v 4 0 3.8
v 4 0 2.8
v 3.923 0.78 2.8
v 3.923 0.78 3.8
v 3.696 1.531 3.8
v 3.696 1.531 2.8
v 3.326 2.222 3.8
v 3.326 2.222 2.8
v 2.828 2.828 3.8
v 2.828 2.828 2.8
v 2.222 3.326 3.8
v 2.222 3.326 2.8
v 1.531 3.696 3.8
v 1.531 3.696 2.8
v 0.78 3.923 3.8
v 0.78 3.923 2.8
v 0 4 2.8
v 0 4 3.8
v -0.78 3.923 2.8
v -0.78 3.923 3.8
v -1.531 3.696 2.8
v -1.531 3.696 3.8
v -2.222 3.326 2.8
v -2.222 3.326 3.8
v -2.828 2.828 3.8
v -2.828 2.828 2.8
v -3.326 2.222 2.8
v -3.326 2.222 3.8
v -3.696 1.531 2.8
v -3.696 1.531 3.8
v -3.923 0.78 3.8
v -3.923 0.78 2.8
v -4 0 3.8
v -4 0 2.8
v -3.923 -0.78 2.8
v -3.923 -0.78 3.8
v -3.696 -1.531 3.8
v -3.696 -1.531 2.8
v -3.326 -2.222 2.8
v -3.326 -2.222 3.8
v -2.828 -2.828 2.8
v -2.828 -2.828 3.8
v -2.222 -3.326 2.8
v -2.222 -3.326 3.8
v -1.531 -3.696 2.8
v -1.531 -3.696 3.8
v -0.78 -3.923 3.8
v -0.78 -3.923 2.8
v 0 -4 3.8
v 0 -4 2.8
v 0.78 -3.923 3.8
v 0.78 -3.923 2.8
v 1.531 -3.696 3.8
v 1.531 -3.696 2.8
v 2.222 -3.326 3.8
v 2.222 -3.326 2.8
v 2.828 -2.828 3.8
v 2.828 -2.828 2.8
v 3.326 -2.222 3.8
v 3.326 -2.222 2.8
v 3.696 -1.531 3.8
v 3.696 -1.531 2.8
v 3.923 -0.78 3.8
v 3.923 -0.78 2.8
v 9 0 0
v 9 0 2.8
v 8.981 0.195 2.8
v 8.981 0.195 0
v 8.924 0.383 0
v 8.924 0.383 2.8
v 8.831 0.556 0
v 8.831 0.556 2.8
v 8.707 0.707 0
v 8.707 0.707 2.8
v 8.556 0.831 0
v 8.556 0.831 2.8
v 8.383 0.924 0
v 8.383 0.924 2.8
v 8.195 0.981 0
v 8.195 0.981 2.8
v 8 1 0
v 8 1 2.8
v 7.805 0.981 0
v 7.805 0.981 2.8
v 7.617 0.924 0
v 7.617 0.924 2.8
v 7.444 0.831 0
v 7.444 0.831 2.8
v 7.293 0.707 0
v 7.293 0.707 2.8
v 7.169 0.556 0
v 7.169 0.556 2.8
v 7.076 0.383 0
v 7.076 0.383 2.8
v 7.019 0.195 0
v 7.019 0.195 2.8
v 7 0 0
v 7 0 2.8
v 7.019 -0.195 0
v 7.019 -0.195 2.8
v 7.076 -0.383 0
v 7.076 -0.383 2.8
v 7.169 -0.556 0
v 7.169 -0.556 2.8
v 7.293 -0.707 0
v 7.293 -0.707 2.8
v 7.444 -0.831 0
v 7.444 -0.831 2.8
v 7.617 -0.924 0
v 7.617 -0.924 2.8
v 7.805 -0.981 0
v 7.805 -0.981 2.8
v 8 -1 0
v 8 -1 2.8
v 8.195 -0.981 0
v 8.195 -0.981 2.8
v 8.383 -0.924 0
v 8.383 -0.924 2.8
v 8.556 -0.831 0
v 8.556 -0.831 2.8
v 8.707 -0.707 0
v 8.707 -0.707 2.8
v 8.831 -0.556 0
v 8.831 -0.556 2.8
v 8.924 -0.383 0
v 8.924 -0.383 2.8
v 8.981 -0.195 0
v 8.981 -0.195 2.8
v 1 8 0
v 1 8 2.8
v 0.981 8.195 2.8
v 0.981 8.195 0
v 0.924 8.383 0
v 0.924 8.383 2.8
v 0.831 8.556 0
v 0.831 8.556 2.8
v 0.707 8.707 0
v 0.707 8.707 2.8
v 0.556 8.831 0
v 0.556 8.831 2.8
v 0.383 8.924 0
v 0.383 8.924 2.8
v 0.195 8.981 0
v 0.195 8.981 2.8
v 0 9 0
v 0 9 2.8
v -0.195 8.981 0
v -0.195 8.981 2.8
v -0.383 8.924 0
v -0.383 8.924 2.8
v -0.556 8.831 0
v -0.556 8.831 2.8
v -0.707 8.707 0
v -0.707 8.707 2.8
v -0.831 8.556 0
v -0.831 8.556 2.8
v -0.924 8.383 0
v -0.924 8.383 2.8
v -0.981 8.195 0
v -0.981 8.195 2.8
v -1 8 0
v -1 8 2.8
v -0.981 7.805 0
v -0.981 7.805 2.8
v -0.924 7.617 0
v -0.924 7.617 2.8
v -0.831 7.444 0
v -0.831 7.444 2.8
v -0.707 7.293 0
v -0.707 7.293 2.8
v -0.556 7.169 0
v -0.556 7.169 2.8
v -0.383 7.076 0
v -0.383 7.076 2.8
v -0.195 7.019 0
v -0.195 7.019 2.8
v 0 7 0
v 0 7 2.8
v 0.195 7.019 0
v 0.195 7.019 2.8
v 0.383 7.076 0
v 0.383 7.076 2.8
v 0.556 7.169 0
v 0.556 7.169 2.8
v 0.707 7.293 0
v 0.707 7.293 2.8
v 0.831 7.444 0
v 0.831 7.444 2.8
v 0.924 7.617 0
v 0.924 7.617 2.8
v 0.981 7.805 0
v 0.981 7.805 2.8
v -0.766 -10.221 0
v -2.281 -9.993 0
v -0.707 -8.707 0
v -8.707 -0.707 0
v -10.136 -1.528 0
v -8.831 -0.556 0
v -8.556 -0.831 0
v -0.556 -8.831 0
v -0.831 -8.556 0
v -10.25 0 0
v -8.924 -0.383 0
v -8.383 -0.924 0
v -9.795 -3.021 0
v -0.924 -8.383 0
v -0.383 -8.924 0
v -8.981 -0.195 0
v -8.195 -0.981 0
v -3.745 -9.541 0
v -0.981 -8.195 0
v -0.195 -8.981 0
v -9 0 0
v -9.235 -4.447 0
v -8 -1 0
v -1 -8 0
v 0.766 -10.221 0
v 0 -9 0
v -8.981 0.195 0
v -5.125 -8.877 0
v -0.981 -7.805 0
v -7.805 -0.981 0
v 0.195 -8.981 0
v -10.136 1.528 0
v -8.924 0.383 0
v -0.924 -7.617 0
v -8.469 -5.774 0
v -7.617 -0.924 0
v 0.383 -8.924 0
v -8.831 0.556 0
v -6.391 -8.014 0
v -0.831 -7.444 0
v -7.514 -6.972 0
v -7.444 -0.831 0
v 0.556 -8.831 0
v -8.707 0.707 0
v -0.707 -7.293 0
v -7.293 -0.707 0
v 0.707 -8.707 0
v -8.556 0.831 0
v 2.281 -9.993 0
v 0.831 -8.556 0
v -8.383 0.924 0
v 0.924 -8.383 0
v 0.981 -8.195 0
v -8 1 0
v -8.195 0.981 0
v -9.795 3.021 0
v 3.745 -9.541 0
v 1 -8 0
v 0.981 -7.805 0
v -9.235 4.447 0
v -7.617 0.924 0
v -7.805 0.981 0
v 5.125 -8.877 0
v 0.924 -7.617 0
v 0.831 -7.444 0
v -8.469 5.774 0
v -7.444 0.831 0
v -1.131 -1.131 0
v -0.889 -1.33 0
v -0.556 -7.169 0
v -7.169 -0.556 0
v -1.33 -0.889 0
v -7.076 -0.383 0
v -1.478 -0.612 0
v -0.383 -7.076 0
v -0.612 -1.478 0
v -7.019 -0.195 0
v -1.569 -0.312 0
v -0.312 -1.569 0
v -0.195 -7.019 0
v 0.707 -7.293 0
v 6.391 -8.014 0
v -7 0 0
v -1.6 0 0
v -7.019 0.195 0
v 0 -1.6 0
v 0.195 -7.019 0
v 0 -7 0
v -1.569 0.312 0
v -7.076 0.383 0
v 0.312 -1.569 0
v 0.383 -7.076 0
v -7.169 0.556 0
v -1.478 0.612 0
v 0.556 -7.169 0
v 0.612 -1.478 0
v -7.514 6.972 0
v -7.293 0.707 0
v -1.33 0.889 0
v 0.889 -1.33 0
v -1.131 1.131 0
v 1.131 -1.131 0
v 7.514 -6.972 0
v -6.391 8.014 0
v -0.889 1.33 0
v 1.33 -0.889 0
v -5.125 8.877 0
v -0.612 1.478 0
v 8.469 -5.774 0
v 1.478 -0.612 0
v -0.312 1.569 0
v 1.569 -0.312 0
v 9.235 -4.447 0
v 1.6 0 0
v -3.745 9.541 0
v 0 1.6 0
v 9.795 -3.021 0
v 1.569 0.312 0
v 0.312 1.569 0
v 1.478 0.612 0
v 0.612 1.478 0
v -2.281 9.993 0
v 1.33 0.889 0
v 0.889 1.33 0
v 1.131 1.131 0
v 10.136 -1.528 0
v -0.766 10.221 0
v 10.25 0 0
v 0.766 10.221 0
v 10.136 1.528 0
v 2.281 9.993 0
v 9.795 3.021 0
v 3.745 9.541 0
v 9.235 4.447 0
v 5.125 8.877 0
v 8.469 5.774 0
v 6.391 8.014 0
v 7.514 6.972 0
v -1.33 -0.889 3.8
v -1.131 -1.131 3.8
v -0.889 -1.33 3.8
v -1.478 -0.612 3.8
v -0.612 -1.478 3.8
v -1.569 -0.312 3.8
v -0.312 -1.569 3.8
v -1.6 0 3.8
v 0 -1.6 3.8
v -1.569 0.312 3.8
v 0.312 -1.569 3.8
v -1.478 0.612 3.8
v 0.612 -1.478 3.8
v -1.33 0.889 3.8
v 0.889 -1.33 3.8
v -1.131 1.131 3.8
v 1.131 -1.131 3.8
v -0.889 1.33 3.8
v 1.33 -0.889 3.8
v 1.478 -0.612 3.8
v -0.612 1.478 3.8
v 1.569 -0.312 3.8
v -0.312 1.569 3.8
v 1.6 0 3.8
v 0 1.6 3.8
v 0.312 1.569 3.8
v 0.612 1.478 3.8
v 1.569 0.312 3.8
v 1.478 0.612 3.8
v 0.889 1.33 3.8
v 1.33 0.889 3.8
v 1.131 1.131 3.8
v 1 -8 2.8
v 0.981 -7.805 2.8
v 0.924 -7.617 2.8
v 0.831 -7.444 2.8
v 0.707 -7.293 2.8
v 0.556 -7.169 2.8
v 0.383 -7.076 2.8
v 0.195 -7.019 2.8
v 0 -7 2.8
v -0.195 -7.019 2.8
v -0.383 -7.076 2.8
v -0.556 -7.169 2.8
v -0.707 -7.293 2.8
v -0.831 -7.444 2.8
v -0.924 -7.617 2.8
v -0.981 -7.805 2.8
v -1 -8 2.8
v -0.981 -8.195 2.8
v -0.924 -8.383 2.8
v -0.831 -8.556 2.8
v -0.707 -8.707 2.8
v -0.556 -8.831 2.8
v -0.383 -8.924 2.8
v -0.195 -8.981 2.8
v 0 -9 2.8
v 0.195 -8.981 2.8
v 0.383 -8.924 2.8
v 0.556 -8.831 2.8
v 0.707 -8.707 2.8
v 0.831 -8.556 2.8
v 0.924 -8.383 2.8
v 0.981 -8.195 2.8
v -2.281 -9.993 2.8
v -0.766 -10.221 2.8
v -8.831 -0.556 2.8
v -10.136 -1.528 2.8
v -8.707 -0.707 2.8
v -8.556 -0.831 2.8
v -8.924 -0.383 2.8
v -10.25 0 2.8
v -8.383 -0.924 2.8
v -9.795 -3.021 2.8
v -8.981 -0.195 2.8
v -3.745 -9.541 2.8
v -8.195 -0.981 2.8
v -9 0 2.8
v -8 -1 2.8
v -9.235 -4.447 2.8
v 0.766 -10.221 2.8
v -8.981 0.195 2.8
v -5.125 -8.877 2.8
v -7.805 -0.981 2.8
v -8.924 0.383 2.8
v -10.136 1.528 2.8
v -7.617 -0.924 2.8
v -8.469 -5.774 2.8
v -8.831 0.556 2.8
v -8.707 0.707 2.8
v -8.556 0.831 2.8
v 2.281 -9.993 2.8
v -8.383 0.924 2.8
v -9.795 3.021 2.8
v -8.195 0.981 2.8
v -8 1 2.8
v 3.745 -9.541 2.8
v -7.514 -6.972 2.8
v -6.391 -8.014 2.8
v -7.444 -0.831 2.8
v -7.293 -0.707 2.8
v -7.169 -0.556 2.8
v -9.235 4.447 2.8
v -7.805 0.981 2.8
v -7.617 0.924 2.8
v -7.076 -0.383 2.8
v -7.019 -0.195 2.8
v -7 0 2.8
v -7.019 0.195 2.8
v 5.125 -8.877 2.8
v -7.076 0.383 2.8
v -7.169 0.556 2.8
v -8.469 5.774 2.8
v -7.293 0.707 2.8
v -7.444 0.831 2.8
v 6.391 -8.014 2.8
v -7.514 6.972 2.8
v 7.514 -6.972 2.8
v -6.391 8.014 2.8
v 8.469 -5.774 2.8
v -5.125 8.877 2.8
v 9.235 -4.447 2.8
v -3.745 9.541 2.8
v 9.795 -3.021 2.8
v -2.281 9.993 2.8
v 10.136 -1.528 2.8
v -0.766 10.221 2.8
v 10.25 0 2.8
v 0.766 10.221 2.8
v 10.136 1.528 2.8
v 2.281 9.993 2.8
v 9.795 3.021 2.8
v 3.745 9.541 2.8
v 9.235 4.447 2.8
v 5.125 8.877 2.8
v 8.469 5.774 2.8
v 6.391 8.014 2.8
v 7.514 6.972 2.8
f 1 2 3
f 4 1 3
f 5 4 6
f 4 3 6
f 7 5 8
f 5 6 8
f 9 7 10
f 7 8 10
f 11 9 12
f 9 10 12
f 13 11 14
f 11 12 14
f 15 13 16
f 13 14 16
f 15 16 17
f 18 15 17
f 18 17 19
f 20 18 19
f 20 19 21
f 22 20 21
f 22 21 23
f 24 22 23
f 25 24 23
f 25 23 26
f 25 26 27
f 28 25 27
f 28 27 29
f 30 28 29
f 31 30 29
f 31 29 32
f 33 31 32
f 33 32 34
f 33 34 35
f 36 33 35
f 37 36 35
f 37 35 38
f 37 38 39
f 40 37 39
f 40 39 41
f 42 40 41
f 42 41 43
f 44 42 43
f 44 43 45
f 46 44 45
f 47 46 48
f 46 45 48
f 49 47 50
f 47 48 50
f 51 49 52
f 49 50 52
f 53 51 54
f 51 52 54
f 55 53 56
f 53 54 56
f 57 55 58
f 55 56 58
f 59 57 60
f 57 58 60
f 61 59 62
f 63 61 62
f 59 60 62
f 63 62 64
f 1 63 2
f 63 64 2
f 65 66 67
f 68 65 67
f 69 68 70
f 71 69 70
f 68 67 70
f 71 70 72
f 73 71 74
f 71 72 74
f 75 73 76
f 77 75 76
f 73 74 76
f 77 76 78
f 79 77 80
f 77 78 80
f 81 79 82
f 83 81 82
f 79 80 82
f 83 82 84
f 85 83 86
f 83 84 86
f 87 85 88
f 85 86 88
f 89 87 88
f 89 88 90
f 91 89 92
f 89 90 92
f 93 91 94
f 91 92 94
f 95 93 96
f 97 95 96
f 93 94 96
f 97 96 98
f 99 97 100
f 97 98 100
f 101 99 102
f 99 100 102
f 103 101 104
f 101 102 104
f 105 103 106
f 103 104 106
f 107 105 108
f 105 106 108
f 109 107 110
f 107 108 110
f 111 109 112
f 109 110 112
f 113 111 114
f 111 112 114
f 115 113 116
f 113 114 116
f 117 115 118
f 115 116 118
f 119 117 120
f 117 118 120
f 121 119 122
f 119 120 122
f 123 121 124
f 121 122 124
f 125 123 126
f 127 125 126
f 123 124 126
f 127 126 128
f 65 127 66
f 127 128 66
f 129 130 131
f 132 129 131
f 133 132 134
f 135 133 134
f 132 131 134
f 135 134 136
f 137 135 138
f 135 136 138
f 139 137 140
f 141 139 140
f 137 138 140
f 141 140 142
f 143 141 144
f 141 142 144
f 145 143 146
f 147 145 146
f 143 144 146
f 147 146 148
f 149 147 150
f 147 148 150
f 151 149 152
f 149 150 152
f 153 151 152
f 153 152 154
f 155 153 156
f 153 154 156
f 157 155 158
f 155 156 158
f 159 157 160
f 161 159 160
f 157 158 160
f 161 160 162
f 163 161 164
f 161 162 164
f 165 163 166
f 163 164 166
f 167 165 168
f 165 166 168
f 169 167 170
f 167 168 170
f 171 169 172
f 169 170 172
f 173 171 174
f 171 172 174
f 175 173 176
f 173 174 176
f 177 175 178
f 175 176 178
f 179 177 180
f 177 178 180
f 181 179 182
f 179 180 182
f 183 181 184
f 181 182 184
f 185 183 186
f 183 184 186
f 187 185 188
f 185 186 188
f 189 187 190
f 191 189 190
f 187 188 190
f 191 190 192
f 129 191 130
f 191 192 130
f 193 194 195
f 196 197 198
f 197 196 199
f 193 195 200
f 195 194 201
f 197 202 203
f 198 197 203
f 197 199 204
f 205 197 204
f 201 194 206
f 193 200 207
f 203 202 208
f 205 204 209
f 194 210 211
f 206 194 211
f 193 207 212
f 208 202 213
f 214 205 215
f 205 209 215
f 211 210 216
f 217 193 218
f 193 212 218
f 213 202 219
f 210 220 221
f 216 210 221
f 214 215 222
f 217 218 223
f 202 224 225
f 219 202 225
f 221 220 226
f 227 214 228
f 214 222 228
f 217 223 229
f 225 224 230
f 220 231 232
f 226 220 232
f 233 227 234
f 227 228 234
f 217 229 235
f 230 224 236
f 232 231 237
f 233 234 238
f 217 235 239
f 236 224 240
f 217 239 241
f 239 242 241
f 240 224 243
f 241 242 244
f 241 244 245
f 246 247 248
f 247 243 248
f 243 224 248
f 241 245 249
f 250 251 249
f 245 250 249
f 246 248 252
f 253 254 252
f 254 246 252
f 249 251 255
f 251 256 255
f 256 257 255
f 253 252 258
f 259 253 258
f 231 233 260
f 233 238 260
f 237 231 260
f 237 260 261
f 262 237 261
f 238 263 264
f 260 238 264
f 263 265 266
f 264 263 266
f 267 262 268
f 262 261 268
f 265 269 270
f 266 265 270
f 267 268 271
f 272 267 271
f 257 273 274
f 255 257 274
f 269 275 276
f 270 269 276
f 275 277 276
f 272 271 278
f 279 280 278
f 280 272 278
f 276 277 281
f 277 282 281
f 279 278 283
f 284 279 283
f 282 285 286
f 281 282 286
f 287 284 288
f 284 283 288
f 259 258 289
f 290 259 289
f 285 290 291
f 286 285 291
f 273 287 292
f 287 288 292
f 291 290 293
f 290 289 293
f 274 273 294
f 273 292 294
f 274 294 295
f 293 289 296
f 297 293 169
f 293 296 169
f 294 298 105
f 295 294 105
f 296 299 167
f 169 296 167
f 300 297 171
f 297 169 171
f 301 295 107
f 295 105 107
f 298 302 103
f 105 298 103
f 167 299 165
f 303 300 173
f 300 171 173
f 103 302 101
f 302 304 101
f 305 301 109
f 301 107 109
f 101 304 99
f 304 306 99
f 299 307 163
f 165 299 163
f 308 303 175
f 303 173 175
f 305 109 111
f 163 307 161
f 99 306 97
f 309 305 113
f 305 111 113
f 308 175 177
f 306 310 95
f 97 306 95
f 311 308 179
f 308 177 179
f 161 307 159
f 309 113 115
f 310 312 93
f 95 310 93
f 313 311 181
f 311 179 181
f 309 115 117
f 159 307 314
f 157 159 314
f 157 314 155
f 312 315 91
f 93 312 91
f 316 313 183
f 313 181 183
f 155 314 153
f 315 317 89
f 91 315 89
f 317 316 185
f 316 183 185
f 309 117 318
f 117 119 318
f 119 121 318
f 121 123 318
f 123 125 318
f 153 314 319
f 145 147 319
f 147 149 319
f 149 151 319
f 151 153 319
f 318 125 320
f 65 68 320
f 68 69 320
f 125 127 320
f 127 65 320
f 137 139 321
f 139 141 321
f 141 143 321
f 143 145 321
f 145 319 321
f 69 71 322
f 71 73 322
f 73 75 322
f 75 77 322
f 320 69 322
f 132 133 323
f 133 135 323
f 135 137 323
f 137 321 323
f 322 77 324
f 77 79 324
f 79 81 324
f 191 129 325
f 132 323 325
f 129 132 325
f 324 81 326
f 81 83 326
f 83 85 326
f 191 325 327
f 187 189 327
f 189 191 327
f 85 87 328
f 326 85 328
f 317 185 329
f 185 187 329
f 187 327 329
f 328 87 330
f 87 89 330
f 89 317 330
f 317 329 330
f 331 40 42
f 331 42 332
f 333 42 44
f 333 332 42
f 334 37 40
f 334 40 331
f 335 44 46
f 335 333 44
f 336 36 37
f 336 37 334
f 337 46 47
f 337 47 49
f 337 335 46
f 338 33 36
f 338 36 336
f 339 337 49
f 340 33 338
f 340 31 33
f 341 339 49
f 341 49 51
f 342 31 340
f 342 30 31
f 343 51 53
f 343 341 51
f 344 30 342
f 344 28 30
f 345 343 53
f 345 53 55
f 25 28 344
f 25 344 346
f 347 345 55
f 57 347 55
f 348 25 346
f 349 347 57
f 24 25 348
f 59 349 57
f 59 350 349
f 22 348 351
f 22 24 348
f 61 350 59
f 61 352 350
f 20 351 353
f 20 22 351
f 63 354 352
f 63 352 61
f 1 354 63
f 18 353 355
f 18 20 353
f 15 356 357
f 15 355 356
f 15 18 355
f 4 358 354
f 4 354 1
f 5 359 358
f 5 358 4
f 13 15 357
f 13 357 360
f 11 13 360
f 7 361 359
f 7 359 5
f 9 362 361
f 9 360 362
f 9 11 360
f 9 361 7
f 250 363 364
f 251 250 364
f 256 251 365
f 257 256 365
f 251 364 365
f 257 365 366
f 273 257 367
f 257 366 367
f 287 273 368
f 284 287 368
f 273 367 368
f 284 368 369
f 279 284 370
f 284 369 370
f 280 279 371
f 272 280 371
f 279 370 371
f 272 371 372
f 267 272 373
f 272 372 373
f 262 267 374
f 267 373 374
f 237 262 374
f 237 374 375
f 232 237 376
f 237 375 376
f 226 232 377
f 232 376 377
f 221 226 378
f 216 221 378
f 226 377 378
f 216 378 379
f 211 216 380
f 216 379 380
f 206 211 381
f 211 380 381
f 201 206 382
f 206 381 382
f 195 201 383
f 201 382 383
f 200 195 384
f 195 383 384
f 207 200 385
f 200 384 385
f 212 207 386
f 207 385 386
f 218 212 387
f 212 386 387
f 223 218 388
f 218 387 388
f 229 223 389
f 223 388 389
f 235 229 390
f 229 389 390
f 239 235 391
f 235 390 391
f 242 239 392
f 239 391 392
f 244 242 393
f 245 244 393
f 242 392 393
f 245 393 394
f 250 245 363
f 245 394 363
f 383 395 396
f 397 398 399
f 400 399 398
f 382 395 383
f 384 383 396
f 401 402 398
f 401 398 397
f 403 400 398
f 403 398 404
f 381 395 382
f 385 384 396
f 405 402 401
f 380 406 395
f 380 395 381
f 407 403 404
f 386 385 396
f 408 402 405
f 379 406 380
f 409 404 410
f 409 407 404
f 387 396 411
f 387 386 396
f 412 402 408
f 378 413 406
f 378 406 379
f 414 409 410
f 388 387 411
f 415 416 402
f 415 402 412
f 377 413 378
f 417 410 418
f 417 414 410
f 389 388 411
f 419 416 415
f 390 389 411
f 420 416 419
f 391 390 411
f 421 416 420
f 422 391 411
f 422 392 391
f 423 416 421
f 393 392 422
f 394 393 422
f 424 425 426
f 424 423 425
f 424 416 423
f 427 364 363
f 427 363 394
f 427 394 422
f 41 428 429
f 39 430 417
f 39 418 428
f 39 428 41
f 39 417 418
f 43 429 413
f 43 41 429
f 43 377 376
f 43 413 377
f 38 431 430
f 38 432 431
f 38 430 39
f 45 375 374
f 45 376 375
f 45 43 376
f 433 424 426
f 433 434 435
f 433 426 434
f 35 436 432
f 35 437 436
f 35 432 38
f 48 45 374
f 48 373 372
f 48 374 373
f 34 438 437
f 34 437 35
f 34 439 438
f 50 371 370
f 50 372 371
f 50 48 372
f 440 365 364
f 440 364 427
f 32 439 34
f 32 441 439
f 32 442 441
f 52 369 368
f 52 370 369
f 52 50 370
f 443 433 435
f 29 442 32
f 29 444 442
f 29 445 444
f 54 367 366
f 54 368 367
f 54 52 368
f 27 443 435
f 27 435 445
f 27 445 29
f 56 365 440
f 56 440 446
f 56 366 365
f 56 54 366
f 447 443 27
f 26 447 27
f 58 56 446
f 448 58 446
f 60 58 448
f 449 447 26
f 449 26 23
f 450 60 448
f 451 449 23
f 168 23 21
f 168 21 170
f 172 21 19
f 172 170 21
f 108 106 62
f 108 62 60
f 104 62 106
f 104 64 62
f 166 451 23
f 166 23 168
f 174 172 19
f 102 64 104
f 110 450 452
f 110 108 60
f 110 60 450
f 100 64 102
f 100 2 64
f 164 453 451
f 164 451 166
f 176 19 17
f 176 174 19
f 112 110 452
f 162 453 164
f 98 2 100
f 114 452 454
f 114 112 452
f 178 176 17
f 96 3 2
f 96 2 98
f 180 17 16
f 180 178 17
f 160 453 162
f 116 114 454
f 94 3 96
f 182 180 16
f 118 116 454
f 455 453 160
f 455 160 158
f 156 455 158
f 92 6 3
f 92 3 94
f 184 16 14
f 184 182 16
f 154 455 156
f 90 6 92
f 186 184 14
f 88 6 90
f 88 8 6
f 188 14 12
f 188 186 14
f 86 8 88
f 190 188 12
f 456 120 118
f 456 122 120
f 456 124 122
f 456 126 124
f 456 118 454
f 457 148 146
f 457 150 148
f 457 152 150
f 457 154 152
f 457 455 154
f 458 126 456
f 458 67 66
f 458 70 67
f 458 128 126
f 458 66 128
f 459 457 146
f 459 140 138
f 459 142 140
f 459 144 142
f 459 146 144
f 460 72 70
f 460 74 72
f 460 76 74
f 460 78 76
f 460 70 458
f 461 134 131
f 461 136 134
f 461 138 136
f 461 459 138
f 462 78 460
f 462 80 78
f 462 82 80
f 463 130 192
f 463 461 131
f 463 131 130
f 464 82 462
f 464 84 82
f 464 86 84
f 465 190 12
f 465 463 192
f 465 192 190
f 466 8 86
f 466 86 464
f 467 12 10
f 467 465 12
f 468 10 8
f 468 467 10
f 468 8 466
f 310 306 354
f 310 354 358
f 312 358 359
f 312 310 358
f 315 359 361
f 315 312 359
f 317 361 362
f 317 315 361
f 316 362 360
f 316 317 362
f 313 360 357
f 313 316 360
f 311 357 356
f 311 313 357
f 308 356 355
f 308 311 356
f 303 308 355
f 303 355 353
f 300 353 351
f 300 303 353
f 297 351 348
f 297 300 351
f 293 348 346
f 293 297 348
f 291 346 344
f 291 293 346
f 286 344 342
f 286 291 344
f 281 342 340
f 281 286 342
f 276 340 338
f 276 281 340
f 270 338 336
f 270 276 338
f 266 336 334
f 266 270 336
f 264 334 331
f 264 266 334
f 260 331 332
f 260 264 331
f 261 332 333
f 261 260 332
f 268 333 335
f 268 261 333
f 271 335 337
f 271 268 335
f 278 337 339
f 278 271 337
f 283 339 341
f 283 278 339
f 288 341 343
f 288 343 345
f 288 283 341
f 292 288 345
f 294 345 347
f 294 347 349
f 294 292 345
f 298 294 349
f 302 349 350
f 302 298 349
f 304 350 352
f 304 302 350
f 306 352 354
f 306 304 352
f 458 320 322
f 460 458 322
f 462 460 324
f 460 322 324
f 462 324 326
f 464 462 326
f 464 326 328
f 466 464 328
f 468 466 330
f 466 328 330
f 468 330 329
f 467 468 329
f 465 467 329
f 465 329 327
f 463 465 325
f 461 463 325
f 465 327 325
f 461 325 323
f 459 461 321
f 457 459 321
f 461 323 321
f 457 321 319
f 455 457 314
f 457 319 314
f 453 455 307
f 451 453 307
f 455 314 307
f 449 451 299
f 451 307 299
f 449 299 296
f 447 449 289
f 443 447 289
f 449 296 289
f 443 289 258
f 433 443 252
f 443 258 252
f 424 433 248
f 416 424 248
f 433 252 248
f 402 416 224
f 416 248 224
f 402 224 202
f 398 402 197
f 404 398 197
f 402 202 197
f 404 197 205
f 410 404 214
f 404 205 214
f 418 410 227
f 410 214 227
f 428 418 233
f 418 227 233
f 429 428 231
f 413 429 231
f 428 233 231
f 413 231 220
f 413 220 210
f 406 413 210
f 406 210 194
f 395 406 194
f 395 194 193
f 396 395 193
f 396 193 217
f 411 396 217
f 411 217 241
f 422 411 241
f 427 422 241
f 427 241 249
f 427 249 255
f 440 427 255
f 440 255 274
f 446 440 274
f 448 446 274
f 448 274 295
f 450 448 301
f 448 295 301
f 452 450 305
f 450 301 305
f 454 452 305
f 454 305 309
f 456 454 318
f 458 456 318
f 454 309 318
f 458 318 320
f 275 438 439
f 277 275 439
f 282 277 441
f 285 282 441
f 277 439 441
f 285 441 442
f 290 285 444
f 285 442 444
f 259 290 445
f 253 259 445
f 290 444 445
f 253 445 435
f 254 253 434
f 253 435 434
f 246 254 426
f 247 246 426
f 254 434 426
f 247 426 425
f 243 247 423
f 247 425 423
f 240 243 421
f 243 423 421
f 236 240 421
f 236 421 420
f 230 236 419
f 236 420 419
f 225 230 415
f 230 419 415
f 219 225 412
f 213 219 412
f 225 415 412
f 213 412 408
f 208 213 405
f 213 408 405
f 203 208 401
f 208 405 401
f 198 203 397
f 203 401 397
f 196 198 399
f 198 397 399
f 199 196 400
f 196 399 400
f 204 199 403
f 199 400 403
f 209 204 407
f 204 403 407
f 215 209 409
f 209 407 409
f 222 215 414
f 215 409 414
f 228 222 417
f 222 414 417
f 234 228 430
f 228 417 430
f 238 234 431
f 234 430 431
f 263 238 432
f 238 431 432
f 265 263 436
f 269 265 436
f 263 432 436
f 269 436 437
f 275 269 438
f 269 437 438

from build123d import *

# Parameters (mm, degrees)
SKETCH1_R           = 10.25
SKETCH1_R_2         = 4
BOSS_EXTRUDE1_DEPTH = 2.8
SKETCH1_3_R         = 4
SKETCH1_3_R_2       = 1.6
BOSS_EXTRUDE2_DEPTH = 3.8
SKETCH2_R           = 1
CUT_EXTRUDE1_DEPTH  = 2.8


with BuildPart() as part:
    # Sketch1 → Boss-Extrude1 (new body)
    with BuildSketch(Plane.XY):
        Circle(SKETCH1_R)
        Circle(SKETCH1_R_2, mode=Mode.SUBTRACT)
    extrude(amount=BOSS_EXTRUDE1_DEPTH)

    # Sketch1<3> → Boss-Extrude2 (add)
    with BuildSketch(Plane.XY):
        Circle(SKETCH1_3_R)
        Circle(SKETCH1_3_R_2, mode=Mode.SUBTRACT)
    extrude(amount=BOSS_EXTRUDE2_DEPTH)

    # Sketch2 → Cut-Extrude1 (cut)
    with BuildSketch(Plane.XY.offset(2.8)):
        with Locations((0, 8)):
            Circle(SKETCH2_R)
        with Locations((8, 0)):
            Circle(SKETCH2_R)
        with Locations((0, -8)):
            Circle(SKETCH2_R)
        with Locations((-8, 0)):
            Circle(SKETCH2_R)
    extrude(amount=-CUT_EXTRUDE1_DEPTH, mode=Mode.SUBTRACT)


solid = part.part
